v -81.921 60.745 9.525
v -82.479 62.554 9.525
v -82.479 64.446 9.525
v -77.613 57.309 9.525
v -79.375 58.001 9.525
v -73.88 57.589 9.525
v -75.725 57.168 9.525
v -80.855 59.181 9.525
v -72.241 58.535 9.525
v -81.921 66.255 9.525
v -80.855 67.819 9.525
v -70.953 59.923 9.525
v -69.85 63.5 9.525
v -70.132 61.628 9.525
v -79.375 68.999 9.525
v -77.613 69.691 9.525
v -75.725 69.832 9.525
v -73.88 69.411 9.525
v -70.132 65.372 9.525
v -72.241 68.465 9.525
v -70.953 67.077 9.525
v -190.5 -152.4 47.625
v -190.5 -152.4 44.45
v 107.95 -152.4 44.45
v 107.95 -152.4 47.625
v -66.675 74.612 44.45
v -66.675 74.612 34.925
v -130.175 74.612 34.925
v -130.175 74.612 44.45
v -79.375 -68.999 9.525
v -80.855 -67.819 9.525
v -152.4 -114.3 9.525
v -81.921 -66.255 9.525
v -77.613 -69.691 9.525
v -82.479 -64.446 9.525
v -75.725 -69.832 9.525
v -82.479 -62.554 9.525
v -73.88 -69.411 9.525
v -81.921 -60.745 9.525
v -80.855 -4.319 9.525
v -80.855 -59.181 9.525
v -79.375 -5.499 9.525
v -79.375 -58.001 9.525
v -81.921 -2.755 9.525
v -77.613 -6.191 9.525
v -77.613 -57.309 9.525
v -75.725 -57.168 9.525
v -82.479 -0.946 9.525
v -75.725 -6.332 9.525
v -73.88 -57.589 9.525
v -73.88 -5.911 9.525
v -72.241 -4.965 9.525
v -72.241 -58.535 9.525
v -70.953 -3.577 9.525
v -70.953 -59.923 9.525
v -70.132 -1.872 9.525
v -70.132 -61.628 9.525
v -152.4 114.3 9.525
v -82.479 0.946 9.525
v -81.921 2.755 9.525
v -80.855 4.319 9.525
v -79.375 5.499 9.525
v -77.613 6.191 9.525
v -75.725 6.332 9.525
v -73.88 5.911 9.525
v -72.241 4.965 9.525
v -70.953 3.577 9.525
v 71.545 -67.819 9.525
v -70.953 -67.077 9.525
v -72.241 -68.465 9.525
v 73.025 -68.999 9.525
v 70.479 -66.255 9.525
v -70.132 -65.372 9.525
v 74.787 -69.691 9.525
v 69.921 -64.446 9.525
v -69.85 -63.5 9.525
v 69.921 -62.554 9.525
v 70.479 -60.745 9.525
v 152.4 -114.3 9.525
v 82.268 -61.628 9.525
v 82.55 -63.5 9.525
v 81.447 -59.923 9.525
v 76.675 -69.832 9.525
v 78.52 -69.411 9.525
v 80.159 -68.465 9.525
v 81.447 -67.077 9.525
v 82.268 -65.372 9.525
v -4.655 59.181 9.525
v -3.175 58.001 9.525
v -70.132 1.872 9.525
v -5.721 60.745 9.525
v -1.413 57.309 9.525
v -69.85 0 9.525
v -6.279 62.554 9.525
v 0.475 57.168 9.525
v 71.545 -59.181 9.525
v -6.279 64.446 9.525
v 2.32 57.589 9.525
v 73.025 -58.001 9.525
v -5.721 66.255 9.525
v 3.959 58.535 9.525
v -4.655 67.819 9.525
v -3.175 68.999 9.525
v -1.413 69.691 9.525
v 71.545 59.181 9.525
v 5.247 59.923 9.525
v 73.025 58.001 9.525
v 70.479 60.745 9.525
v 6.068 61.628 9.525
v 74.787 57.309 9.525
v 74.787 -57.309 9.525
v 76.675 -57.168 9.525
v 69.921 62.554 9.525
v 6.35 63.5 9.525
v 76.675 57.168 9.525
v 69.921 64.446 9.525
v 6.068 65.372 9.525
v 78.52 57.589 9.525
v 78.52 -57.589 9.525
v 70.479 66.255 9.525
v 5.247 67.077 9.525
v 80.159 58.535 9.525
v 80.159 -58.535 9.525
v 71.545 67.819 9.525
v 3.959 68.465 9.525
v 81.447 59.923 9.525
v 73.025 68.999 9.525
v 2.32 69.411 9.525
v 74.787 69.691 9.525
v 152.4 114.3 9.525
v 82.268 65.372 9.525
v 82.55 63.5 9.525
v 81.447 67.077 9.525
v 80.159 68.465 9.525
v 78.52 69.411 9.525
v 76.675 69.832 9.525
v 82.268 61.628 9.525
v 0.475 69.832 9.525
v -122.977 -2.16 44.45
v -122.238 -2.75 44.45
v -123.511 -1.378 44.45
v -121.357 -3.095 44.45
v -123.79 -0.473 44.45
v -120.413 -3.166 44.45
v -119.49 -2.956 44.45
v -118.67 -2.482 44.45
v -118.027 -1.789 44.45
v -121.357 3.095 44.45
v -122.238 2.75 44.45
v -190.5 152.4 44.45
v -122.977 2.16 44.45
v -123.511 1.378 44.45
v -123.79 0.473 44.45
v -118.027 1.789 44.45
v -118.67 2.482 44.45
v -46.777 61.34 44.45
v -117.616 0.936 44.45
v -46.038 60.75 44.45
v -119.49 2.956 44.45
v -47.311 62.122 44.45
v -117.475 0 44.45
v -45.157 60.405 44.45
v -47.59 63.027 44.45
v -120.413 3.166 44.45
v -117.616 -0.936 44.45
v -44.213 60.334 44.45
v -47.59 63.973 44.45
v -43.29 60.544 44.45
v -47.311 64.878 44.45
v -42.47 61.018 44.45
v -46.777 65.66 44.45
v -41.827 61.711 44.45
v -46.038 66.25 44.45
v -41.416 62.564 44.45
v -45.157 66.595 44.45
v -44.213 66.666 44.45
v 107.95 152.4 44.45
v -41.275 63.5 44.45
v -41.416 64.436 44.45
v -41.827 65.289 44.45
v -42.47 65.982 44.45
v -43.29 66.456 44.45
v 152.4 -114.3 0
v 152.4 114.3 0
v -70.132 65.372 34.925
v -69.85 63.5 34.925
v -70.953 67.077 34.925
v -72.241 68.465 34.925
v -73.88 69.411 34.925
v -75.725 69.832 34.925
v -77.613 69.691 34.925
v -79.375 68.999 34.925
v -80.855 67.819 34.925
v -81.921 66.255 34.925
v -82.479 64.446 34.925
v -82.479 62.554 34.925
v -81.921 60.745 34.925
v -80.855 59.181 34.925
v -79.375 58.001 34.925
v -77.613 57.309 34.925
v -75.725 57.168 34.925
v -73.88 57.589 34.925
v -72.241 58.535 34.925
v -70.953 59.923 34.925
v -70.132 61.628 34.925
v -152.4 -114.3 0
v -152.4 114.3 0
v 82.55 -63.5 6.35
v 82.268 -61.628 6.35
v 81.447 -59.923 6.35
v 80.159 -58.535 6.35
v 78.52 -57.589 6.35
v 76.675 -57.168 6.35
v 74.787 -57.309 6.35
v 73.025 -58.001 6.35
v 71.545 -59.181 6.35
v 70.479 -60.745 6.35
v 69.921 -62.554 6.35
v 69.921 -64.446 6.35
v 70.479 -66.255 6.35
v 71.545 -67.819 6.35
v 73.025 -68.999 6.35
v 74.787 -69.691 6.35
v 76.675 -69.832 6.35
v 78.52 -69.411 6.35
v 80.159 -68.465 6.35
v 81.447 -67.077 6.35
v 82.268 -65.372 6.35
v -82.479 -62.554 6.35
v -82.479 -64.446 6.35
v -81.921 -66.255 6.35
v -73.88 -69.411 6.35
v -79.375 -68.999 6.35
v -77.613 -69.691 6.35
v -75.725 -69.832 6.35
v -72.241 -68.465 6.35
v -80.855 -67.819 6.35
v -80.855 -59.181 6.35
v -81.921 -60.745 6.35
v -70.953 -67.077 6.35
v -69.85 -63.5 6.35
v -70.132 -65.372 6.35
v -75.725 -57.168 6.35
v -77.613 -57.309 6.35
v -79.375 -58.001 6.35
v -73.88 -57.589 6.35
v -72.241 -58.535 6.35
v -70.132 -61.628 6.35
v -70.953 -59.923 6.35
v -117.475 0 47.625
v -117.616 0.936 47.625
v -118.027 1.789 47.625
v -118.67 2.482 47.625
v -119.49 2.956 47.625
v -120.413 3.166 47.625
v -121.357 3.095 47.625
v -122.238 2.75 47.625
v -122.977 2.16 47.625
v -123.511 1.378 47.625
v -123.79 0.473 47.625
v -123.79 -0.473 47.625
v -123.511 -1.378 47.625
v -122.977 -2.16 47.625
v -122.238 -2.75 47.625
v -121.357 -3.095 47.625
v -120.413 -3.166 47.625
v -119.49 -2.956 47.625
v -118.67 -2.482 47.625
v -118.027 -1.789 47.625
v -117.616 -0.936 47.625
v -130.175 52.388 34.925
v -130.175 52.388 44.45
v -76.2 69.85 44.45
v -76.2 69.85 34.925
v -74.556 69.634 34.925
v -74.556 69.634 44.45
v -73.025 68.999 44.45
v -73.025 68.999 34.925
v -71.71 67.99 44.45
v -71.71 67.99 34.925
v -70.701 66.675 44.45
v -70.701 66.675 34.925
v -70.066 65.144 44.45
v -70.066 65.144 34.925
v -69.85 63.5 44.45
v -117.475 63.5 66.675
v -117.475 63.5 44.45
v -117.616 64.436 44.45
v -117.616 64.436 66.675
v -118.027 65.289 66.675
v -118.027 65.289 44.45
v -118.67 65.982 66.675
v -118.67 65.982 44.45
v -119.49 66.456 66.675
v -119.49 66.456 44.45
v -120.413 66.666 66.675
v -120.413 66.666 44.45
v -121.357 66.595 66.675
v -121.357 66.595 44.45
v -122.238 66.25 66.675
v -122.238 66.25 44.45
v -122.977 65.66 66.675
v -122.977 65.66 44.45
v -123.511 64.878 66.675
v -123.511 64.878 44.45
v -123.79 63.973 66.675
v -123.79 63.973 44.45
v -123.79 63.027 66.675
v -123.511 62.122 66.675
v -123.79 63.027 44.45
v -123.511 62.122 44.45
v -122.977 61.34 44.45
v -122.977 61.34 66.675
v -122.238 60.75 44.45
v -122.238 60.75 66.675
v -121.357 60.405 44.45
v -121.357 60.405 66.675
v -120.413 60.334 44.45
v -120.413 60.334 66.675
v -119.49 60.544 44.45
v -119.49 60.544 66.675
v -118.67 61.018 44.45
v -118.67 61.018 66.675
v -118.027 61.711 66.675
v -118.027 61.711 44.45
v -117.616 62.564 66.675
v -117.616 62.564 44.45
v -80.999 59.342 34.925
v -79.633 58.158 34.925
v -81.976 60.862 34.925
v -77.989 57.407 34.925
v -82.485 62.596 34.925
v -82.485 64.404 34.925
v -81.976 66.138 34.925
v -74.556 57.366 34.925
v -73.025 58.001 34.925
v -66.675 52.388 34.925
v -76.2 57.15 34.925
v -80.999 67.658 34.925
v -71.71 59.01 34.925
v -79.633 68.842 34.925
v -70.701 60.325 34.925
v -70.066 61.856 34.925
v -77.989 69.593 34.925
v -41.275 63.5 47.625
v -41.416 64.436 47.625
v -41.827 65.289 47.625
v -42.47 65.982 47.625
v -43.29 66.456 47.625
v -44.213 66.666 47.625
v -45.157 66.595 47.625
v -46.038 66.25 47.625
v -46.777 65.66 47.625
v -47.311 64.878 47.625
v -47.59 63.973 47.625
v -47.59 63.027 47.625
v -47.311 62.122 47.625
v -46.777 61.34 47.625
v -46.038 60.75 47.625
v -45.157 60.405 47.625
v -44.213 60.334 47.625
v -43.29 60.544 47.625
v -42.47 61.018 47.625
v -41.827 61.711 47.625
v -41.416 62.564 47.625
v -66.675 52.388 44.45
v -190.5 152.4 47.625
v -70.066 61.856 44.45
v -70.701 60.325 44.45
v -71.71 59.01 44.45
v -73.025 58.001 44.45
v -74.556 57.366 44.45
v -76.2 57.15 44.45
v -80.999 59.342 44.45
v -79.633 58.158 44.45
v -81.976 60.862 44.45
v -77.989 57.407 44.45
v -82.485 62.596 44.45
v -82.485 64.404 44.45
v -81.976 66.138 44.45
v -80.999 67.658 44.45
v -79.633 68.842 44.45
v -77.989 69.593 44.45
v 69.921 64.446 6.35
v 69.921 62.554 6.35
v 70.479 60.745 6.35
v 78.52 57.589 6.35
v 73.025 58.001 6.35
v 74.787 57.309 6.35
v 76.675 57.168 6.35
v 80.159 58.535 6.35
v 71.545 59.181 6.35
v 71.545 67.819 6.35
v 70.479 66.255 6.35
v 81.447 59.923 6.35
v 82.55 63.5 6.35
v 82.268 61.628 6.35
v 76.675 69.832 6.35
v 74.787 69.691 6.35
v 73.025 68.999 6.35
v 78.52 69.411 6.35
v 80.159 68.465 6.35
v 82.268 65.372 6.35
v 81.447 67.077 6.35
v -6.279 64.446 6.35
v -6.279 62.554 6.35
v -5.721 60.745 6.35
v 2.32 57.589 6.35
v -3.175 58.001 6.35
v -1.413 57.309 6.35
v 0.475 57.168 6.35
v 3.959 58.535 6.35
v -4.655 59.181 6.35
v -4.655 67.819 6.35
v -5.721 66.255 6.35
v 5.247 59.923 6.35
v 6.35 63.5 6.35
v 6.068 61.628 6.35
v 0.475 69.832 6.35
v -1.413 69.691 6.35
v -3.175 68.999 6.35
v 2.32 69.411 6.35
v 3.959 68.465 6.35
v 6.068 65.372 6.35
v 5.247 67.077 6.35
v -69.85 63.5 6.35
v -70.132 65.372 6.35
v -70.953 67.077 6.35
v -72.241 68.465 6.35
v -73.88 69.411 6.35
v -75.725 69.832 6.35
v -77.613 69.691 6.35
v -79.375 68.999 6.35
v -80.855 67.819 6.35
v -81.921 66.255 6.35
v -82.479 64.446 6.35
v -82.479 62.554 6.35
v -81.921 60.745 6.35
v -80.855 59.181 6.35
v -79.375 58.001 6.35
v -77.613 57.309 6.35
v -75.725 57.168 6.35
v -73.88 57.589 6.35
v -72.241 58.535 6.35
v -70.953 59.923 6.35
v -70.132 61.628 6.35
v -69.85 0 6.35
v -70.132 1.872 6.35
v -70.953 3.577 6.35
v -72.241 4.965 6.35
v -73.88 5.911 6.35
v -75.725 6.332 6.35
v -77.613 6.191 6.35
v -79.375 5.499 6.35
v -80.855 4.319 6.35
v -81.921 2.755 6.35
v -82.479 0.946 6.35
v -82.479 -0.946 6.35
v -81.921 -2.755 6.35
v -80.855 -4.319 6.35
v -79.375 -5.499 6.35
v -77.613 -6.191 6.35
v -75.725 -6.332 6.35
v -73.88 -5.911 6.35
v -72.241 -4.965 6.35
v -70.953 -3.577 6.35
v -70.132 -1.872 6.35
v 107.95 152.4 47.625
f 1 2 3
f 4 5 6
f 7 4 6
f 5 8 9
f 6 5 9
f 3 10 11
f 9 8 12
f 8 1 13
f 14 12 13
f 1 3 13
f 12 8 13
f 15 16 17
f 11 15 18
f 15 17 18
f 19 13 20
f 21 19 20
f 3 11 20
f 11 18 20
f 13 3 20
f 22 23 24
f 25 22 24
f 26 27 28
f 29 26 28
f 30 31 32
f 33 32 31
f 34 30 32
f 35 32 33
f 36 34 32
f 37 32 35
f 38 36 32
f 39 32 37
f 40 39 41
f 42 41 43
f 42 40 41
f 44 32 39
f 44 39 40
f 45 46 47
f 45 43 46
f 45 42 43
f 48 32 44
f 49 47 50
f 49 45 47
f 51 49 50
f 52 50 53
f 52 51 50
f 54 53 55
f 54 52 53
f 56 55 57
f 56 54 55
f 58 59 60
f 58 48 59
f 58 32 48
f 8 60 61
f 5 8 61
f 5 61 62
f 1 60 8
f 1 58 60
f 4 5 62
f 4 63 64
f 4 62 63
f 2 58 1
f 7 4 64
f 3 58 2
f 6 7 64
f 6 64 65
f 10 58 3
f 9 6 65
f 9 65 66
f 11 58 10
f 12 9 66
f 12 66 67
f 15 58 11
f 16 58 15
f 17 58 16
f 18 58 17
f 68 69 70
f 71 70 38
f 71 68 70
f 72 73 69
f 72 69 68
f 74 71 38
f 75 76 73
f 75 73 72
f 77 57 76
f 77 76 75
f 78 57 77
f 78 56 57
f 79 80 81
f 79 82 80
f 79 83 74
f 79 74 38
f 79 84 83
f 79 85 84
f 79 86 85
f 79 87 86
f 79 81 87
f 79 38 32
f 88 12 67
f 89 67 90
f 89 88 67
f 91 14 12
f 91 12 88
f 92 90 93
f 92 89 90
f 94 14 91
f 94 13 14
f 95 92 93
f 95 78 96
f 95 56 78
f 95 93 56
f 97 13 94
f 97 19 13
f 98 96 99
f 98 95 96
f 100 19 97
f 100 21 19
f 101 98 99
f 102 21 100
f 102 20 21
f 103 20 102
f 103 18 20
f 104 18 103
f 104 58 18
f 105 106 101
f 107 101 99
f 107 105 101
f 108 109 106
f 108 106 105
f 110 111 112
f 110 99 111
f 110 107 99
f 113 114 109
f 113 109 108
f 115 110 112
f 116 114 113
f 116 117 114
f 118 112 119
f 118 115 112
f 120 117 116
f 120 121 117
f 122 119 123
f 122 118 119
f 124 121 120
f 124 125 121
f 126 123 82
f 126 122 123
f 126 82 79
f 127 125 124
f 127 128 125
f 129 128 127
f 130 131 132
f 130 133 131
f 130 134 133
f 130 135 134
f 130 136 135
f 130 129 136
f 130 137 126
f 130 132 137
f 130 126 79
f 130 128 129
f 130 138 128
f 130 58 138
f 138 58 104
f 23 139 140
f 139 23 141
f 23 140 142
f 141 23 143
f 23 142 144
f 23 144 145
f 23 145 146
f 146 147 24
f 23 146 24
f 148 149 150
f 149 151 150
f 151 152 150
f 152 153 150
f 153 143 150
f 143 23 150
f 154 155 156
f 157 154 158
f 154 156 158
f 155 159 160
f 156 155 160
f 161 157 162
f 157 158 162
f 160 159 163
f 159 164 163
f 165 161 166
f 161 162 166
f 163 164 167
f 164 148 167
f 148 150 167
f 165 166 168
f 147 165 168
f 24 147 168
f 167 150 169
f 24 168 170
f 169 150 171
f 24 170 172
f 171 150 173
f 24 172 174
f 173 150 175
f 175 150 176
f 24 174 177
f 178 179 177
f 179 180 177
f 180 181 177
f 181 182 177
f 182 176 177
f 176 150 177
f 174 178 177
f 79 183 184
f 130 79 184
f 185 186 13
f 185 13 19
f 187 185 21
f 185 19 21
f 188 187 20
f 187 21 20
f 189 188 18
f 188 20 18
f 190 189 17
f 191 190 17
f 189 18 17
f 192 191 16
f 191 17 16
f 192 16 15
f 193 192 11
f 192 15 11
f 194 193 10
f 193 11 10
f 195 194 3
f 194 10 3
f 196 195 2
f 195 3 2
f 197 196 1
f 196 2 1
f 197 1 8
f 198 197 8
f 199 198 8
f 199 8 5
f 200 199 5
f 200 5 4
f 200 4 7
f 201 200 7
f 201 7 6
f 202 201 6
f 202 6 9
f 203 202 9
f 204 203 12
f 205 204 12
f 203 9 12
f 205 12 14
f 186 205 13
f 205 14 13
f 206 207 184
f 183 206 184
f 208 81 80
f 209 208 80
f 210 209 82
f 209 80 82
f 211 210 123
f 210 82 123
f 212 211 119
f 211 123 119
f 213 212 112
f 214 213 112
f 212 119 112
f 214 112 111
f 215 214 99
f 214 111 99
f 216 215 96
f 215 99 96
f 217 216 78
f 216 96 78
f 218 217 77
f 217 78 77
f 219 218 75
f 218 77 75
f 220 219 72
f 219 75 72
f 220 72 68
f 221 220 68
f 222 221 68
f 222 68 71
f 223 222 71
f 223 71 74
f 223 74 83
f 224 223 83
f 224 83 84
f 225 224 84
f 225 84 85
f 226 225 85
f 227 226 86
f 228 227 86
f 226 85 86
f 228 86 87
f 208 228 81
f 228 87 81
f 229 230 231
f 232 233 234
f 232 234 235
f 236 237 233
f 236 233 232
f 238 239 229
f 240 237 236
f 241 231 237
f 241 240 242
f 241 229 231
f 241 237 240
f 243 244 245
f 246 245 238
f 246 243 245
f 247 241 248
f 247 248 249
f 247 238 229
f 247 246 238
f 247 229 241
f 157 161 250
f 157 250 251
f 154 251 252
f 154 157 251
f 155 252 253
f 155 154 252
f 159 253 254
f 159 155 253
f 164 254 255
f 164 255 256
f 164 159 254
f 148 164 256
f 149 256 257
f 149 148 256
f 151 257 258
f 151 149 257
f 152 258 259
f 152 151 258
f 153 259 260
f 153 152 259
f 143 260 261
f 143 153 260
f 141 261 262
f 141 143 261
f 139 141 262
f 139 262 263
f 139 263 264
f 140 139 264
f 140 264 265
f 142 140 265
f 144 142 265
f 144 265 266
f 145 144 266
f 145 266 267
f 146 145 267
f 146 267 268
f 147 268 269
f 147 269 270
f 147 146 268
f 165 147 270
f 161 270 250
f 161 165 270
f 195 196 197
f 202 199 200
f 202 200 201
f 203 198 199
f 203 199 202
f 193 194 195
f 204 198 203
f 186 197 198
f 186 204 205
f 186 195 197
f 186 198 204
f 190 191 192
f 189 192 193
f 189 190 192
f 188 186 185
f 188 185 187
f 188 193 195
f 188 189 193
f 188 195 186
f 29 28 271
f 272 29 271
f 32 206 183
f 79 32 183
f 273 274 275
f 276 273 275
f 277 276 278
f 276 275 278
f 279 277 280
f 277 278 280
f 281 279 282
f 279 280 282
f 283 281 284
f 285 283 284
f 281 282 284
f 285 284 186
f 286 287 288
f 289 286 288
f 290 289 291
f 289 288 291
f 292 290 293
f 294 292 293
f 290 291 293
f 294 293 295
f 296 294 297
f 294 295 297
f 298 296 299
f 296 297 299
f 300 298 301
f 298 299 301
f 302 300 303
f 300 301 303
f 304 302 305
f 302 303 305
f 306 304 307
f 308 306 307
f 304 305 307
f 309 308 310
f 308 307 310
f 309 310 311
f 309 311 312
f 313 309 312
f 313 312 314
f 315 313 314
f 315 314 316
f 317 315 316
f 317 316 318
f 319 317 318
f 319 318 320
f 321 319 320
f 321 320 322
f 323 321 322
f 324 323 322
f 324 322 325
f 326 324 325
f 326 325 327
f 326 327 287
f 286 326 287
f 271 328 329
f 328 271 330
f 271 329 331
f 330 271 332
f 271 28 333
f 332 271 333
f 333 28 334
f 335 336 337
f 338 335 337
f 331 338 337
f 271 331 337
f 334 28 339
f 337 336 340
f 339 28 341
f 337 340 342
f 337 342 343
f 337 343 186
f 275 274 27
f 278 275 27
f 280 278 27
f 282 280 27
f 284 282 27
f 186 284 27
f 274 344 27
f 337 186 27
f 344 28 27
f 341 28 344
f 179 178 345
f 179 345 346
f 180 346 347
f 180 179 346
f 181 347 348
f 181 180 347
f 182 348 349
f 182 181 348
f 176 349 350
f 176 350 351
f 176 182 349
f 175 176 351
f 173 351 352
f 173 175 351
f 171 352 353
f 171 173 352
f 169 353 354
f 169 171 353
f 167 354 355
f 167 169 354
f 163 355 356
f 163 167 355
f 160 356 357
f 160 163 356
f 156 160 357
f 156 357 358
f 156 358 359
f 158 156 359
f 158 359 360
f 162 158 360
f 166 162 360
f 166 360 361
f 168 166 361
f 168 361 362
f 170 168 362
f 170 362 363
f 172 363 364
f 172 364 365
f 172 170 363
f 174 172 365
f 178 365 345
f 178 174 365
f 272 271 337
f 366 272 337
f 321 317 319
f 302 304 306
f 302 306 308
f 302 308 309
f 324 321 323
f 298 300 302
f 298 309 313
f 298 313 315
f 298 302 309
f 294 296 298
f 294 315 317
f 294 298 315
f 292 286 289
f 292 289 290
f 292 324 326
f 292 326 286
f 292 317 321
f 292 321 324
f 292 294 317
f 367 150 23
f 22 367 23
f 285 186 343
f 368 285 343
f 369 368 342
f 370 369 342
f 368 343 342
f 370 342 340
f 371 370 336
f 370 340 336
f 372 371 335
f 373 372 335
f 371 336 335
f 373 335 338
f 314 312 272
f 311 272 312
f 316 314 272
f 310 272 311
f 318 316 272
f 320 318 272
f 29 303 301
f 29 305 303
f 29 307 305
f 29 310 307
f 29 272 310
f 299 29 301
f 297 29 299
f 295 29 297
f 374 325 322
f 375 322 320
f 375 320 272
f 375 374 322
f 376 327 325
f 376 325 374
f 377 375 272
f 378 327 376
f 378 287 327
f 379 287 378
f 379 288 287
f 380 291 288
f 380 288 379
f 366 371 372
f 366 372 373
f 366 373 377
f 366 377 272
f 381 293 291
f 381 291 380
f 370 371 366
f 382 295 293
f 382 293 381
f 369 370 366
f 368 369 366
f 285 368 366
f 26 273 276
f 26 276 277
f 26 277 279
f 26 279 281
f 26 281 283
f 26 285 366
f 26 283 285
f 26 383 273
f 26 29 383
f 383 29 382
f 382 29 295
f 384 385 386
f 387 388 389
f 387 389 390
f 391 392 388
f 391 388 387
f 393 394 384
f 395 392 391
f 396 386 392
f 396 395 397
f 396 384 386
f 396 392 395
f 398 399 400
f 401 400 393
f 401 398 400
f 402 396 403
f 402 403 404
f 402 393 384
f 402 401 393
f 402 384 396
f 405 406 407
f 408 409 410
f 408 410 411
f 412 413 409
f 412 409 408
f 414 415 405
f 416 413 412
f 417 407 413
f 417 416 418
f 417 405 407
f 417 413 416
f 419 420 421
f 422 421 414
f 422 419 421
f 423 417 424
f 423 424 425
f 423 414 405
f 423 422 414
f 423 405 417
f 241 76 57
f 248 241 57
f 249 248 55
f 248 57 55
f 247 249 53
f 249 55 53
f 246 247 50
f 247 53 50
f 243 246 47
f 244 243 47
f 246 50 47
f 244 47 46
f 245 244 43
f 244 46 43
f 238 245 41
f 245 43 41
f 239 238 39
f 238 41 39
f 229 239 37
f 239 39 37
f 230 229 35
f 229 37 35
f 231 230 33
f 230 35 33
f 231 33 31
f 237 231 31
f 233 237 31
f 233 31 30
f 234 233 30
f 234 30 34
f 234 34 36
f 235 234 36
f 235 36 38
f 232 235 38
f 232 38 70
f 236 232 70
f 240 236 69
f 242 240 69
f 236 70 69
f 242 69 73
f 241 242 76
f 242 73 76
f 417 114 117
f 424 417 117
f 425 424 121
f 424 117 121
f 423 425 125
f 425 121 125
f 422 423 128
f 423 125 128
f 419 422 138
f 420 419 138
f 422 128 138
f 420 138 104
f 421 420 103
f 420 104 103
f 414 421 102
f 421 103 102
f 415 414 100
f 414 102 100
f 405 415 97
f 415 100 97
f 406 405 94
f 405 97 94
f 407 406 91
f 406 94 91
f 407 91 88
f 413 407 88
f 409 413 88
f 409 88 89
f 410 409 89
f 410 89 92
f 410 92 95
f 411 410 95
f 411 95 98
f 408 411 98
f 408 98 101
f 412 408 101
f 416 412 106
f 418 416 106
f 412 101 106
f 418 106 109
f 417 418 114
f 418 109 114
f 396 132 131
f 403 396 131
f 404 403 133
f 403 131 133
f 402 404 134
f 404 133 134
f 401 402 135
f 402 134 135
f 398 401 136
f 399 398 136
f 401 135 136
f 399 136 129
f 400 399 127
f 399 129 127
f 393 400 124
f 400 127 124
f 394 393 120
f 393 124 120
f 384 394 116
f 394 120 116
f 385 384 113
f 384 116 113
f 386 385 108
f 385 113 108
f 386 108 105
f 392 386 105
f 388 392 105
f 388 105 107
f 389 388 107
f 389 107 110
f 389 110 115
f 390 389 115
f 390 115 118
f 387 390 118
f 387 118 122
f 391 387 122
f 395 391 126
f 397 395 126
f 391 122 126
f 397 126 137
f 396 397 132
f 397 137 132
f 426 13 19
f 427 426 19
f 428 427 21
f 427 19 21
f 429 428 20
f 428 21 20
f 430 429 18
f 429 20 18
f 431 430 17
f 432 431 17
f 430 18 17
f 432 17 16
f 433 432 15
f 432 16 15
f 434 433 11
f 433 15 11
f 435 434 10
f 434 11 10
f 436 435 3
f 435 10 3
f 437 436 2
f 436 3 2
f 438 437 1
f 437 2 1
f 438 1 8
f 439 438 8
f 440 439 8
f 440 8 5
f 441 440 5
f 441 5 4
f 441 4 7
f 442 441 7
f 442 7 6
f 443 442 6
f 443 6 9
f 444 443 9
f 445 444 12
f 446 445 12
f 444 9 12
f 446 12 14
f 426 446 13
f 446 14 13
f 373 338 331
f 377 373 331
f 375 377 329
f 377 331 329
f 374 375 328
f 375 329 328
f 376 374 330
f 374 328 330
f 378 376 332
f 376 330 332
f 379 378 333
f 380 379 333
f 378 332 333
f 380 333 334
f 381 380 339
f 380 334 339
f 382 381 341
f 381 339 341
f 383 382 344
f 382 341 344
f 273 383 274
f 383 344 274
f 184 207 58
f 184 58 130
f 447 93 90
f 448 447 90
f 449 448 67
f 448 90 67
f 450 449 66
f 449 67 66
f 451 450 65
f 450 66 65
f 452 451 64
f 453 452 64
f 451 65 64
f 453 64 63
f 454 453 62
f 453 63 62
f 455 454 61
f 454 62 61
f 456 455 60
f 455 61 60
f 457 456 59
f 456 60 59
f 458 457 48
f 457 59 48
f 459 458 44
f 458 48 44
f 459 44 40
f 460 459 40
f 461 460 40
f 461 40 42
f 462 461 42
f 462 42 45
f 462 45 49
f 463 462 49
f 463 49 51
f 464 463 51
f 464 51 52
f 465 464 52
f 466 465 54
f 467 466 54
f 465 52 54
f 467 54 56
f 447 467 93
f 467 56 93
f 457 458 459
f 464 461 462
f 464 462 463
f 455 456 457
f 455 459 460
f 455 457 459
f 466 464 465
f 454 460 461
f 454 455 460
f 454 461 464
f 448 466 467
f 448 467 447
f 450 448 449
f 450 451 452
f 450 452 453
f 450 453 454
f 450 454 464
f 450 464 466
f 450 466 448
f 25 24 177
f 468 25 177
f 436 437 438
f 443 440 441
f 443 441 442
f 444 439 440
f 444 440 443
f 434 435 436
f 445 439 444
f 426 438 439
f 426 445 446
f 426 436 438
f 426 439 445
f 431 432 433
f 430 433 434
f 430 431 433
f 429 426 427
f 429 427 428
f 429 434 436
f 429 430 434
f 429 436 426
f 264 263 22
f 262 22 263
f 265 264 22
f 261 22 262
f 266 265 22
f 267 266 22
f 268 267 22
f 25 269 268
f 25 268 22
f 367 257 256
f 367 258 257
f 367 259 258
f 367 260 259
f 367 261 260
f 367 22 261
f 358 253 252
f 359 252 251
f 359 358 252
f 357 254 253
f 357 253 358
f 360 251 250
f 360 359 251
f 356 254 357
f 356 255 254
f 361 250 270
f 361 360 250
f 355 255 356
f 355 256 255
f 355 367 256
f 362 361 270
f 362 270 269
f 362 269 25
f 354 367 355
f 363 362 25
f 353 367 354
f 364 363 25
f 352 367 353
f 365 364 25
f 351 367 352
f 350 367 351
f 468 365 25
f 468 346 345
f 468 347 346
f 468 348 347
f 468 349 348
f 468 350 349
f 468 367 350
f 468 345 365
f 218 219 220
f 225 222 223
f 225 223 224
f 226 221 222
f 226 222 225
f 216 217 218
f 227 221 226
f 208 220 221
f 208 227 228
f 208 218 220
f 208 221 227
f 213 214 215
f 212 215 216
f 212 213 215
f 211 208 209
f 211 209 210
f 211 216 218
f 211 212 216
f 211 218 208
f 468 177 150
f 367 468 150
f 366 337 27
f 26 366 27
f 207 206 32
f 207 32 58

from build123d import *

# Parameters (mm, degrees)
F0_W      = 304.8
F0_H      = 228.6
F1_DEPTH  = 9.525
F2_R      = 6.35
F3_DEPTH  = 25.4
F4_DEPTH  = 3.175
F5_R      = 6.35
F6_DEPTH  = 3.175
F8_DEPTH  = 9.525
F9_R      = 3.175
F10_DEPTH = 3.175
F11_DEPTH = 25.4
F12_W     = 260.35
F12_H     = 228.6
F12_R     = 3.175
F12_W_2   = 63.5
F12_H_2   = 22.225
F12_R_2   = 6.35
F13_DEPTH = 3.175


with BuildPart() as f1:
    # F0 (on Top) → F1 (new body)
    with BuildSketch(Plane.XY):
        Rectangle(F0_W, F0_H)
    extrude(amount=F1_DEPTH)

    # F2 (on face) → F4 (cut)
    with BuildSketch(Plane.XY.offset(9.525)):
        with Locations((-76.2, 63.5)):
            Circle(F2_R)
        with Locations((-76.2, -63.5)):
            Circle(F2_R)
        with Locations((76.2, 63.5)):
            Circle(F2_R)
        with Locations((76.2, -63.5)):
            Circle(F2_R)
    extrude(amount=-F4_DEPTH, mode=Mode.SUBTRACT)

    # F5 (on face) → F6 (cut)
    with BuildSketch(Plane.XY.offset(9.525)):
        with Locations((-76.2, 0)):
            Circle(F5_R)
        with Locations((0, 63.5)):
            Circle(F5_R)
    extrude(amount=-F6_DEPTH, mode=Mode.SUBTRACT)


with BuildPart() as f3:
    # F2 (on face) → F3 (new body)
    with BuildSketch(Plane.XY.offset(9.525)):
        with Locations((-76.2, 63.5)):
            Circle(F2_R)
    extrude(amount=F3_DEPTH)


with BuildPart() as f8:
    # F7 (on face) → F8 (new body)
    with BuildSketch(Plane.XY.offset(34.925)):
        with BuildLine():
            ThreePointArc((-76.2, 69.85), (-71.7098719395, 67.9901280605), (-69.85, 63.5))
            ThreePointArc((-69.85, 63.5), (-71.7098719395, 59.0098719395), (-76.2, 57.15))
            Line((-76.2, 57.15), (-76.2, 52.3875))
            Line((-76.2, 52.3875), (-66.675, 52.3875))
            Line((-66.675, 52.3875), (-66.675, 74.6125))
            Line((-66.675, 74.6125), (-76.2, 74.6125))
            Line((-76.2, 74.6125), (-76.2, 69.85))
        make_face()
        with BuildLine():
            ThreePointArc((-76.2, 57.15), (-82.55, 63.5), (-76.2, 69.85))
            Line((-76.2, 69.85), (-76.2, 74.6125))
            Line((-76.2, 74.6125), (-130.175, 74.6125))
            Line((-130.175, 74.6125), (-130.175, 52.3875))
            Line((-130.175, 52.3875), (-76.2, 52.3875))
            Line((-76.2, 52.3875), (-76.2, 57.15))
        make_face()
    extrude(amount=F8_DEPTH)

    # F9 (on face) → F10 (cut)
    with BuildSketch(Plane.XY.offset(44.45)):
        with Locations((-120.65, 63.5)):
            Circle(F9_R)
    extrude(amount=-F10_DEPTH, mode=Mode.SUBTRACT)

    # F11 (add): a face of the model
    f11_faces = [f8.faces().sort_by_distance(p)[0] for p in [
        (-120.65, 63.5, 41.275),
    ]]
    extrude(f11_faces, amount=F11_DEPTH)


with BuildPart() as f13:
    # F12 (on face) → F13 (new body)
    with BuildSketch(Plane.XY.offset(44.45)):
        with Locations((-22.225, 0)):
            Rectangle(F12_W, F12_H)
        with Locations((-120.65, 0)):
            Circle(F12_R, mode=Mode.SUBTRACT)
        with Locations((-98.425, 63.5)):
            Rectangle(F12_W_2, F12_H_2, mode=Mode.SUBTRACT)
        with Locations((-76.2, 0)):
            Circle(F12_R_2, mode=Mode.SUBTRACT)
        with Locations((-44.45, 63.5)):
            Circle(F12_R, mode=Mode.SUBTRACT)
        with Locations((0, 63.5)):
            Circle(F12_R_2, mode=Mode.SUBTRACT)
        Polygon((107.95, -152.4), (107.95, -114.3), (-152.4, -114.3), (-152.4, 114.3), (107.95, 114.3), (107.95, 152.4), (-190.5, 152.4), (-190.5, -152.4), align=None)
        with Locations((-98.425, 63.5)):
            Rectangle(F12_W_2, F12_H_2)
        with Locations((-120.65, 63.5)):
            Circle(F12_R, mode=Mode.SUBTRACT)
        with Locations((-76.2, 63.5)):
            Circle(F12_R_2, mode=Mode.SUBTRACT)
        with Locations((-76.2, 63.5)):
            Circle(F12_R_2)
        with Locations((0, 63.5)):
            Circle(F12_R_2)
        with Locations((-76.2, 0)):
            Circle(F12_R_2)
        with Locations((-120.65, 63.5)):
            Circle(F12_R)
    extrude(amount=F13_DEPTH)


solid = Compound([f1.part, f3.part, f8.part, f13.part])
